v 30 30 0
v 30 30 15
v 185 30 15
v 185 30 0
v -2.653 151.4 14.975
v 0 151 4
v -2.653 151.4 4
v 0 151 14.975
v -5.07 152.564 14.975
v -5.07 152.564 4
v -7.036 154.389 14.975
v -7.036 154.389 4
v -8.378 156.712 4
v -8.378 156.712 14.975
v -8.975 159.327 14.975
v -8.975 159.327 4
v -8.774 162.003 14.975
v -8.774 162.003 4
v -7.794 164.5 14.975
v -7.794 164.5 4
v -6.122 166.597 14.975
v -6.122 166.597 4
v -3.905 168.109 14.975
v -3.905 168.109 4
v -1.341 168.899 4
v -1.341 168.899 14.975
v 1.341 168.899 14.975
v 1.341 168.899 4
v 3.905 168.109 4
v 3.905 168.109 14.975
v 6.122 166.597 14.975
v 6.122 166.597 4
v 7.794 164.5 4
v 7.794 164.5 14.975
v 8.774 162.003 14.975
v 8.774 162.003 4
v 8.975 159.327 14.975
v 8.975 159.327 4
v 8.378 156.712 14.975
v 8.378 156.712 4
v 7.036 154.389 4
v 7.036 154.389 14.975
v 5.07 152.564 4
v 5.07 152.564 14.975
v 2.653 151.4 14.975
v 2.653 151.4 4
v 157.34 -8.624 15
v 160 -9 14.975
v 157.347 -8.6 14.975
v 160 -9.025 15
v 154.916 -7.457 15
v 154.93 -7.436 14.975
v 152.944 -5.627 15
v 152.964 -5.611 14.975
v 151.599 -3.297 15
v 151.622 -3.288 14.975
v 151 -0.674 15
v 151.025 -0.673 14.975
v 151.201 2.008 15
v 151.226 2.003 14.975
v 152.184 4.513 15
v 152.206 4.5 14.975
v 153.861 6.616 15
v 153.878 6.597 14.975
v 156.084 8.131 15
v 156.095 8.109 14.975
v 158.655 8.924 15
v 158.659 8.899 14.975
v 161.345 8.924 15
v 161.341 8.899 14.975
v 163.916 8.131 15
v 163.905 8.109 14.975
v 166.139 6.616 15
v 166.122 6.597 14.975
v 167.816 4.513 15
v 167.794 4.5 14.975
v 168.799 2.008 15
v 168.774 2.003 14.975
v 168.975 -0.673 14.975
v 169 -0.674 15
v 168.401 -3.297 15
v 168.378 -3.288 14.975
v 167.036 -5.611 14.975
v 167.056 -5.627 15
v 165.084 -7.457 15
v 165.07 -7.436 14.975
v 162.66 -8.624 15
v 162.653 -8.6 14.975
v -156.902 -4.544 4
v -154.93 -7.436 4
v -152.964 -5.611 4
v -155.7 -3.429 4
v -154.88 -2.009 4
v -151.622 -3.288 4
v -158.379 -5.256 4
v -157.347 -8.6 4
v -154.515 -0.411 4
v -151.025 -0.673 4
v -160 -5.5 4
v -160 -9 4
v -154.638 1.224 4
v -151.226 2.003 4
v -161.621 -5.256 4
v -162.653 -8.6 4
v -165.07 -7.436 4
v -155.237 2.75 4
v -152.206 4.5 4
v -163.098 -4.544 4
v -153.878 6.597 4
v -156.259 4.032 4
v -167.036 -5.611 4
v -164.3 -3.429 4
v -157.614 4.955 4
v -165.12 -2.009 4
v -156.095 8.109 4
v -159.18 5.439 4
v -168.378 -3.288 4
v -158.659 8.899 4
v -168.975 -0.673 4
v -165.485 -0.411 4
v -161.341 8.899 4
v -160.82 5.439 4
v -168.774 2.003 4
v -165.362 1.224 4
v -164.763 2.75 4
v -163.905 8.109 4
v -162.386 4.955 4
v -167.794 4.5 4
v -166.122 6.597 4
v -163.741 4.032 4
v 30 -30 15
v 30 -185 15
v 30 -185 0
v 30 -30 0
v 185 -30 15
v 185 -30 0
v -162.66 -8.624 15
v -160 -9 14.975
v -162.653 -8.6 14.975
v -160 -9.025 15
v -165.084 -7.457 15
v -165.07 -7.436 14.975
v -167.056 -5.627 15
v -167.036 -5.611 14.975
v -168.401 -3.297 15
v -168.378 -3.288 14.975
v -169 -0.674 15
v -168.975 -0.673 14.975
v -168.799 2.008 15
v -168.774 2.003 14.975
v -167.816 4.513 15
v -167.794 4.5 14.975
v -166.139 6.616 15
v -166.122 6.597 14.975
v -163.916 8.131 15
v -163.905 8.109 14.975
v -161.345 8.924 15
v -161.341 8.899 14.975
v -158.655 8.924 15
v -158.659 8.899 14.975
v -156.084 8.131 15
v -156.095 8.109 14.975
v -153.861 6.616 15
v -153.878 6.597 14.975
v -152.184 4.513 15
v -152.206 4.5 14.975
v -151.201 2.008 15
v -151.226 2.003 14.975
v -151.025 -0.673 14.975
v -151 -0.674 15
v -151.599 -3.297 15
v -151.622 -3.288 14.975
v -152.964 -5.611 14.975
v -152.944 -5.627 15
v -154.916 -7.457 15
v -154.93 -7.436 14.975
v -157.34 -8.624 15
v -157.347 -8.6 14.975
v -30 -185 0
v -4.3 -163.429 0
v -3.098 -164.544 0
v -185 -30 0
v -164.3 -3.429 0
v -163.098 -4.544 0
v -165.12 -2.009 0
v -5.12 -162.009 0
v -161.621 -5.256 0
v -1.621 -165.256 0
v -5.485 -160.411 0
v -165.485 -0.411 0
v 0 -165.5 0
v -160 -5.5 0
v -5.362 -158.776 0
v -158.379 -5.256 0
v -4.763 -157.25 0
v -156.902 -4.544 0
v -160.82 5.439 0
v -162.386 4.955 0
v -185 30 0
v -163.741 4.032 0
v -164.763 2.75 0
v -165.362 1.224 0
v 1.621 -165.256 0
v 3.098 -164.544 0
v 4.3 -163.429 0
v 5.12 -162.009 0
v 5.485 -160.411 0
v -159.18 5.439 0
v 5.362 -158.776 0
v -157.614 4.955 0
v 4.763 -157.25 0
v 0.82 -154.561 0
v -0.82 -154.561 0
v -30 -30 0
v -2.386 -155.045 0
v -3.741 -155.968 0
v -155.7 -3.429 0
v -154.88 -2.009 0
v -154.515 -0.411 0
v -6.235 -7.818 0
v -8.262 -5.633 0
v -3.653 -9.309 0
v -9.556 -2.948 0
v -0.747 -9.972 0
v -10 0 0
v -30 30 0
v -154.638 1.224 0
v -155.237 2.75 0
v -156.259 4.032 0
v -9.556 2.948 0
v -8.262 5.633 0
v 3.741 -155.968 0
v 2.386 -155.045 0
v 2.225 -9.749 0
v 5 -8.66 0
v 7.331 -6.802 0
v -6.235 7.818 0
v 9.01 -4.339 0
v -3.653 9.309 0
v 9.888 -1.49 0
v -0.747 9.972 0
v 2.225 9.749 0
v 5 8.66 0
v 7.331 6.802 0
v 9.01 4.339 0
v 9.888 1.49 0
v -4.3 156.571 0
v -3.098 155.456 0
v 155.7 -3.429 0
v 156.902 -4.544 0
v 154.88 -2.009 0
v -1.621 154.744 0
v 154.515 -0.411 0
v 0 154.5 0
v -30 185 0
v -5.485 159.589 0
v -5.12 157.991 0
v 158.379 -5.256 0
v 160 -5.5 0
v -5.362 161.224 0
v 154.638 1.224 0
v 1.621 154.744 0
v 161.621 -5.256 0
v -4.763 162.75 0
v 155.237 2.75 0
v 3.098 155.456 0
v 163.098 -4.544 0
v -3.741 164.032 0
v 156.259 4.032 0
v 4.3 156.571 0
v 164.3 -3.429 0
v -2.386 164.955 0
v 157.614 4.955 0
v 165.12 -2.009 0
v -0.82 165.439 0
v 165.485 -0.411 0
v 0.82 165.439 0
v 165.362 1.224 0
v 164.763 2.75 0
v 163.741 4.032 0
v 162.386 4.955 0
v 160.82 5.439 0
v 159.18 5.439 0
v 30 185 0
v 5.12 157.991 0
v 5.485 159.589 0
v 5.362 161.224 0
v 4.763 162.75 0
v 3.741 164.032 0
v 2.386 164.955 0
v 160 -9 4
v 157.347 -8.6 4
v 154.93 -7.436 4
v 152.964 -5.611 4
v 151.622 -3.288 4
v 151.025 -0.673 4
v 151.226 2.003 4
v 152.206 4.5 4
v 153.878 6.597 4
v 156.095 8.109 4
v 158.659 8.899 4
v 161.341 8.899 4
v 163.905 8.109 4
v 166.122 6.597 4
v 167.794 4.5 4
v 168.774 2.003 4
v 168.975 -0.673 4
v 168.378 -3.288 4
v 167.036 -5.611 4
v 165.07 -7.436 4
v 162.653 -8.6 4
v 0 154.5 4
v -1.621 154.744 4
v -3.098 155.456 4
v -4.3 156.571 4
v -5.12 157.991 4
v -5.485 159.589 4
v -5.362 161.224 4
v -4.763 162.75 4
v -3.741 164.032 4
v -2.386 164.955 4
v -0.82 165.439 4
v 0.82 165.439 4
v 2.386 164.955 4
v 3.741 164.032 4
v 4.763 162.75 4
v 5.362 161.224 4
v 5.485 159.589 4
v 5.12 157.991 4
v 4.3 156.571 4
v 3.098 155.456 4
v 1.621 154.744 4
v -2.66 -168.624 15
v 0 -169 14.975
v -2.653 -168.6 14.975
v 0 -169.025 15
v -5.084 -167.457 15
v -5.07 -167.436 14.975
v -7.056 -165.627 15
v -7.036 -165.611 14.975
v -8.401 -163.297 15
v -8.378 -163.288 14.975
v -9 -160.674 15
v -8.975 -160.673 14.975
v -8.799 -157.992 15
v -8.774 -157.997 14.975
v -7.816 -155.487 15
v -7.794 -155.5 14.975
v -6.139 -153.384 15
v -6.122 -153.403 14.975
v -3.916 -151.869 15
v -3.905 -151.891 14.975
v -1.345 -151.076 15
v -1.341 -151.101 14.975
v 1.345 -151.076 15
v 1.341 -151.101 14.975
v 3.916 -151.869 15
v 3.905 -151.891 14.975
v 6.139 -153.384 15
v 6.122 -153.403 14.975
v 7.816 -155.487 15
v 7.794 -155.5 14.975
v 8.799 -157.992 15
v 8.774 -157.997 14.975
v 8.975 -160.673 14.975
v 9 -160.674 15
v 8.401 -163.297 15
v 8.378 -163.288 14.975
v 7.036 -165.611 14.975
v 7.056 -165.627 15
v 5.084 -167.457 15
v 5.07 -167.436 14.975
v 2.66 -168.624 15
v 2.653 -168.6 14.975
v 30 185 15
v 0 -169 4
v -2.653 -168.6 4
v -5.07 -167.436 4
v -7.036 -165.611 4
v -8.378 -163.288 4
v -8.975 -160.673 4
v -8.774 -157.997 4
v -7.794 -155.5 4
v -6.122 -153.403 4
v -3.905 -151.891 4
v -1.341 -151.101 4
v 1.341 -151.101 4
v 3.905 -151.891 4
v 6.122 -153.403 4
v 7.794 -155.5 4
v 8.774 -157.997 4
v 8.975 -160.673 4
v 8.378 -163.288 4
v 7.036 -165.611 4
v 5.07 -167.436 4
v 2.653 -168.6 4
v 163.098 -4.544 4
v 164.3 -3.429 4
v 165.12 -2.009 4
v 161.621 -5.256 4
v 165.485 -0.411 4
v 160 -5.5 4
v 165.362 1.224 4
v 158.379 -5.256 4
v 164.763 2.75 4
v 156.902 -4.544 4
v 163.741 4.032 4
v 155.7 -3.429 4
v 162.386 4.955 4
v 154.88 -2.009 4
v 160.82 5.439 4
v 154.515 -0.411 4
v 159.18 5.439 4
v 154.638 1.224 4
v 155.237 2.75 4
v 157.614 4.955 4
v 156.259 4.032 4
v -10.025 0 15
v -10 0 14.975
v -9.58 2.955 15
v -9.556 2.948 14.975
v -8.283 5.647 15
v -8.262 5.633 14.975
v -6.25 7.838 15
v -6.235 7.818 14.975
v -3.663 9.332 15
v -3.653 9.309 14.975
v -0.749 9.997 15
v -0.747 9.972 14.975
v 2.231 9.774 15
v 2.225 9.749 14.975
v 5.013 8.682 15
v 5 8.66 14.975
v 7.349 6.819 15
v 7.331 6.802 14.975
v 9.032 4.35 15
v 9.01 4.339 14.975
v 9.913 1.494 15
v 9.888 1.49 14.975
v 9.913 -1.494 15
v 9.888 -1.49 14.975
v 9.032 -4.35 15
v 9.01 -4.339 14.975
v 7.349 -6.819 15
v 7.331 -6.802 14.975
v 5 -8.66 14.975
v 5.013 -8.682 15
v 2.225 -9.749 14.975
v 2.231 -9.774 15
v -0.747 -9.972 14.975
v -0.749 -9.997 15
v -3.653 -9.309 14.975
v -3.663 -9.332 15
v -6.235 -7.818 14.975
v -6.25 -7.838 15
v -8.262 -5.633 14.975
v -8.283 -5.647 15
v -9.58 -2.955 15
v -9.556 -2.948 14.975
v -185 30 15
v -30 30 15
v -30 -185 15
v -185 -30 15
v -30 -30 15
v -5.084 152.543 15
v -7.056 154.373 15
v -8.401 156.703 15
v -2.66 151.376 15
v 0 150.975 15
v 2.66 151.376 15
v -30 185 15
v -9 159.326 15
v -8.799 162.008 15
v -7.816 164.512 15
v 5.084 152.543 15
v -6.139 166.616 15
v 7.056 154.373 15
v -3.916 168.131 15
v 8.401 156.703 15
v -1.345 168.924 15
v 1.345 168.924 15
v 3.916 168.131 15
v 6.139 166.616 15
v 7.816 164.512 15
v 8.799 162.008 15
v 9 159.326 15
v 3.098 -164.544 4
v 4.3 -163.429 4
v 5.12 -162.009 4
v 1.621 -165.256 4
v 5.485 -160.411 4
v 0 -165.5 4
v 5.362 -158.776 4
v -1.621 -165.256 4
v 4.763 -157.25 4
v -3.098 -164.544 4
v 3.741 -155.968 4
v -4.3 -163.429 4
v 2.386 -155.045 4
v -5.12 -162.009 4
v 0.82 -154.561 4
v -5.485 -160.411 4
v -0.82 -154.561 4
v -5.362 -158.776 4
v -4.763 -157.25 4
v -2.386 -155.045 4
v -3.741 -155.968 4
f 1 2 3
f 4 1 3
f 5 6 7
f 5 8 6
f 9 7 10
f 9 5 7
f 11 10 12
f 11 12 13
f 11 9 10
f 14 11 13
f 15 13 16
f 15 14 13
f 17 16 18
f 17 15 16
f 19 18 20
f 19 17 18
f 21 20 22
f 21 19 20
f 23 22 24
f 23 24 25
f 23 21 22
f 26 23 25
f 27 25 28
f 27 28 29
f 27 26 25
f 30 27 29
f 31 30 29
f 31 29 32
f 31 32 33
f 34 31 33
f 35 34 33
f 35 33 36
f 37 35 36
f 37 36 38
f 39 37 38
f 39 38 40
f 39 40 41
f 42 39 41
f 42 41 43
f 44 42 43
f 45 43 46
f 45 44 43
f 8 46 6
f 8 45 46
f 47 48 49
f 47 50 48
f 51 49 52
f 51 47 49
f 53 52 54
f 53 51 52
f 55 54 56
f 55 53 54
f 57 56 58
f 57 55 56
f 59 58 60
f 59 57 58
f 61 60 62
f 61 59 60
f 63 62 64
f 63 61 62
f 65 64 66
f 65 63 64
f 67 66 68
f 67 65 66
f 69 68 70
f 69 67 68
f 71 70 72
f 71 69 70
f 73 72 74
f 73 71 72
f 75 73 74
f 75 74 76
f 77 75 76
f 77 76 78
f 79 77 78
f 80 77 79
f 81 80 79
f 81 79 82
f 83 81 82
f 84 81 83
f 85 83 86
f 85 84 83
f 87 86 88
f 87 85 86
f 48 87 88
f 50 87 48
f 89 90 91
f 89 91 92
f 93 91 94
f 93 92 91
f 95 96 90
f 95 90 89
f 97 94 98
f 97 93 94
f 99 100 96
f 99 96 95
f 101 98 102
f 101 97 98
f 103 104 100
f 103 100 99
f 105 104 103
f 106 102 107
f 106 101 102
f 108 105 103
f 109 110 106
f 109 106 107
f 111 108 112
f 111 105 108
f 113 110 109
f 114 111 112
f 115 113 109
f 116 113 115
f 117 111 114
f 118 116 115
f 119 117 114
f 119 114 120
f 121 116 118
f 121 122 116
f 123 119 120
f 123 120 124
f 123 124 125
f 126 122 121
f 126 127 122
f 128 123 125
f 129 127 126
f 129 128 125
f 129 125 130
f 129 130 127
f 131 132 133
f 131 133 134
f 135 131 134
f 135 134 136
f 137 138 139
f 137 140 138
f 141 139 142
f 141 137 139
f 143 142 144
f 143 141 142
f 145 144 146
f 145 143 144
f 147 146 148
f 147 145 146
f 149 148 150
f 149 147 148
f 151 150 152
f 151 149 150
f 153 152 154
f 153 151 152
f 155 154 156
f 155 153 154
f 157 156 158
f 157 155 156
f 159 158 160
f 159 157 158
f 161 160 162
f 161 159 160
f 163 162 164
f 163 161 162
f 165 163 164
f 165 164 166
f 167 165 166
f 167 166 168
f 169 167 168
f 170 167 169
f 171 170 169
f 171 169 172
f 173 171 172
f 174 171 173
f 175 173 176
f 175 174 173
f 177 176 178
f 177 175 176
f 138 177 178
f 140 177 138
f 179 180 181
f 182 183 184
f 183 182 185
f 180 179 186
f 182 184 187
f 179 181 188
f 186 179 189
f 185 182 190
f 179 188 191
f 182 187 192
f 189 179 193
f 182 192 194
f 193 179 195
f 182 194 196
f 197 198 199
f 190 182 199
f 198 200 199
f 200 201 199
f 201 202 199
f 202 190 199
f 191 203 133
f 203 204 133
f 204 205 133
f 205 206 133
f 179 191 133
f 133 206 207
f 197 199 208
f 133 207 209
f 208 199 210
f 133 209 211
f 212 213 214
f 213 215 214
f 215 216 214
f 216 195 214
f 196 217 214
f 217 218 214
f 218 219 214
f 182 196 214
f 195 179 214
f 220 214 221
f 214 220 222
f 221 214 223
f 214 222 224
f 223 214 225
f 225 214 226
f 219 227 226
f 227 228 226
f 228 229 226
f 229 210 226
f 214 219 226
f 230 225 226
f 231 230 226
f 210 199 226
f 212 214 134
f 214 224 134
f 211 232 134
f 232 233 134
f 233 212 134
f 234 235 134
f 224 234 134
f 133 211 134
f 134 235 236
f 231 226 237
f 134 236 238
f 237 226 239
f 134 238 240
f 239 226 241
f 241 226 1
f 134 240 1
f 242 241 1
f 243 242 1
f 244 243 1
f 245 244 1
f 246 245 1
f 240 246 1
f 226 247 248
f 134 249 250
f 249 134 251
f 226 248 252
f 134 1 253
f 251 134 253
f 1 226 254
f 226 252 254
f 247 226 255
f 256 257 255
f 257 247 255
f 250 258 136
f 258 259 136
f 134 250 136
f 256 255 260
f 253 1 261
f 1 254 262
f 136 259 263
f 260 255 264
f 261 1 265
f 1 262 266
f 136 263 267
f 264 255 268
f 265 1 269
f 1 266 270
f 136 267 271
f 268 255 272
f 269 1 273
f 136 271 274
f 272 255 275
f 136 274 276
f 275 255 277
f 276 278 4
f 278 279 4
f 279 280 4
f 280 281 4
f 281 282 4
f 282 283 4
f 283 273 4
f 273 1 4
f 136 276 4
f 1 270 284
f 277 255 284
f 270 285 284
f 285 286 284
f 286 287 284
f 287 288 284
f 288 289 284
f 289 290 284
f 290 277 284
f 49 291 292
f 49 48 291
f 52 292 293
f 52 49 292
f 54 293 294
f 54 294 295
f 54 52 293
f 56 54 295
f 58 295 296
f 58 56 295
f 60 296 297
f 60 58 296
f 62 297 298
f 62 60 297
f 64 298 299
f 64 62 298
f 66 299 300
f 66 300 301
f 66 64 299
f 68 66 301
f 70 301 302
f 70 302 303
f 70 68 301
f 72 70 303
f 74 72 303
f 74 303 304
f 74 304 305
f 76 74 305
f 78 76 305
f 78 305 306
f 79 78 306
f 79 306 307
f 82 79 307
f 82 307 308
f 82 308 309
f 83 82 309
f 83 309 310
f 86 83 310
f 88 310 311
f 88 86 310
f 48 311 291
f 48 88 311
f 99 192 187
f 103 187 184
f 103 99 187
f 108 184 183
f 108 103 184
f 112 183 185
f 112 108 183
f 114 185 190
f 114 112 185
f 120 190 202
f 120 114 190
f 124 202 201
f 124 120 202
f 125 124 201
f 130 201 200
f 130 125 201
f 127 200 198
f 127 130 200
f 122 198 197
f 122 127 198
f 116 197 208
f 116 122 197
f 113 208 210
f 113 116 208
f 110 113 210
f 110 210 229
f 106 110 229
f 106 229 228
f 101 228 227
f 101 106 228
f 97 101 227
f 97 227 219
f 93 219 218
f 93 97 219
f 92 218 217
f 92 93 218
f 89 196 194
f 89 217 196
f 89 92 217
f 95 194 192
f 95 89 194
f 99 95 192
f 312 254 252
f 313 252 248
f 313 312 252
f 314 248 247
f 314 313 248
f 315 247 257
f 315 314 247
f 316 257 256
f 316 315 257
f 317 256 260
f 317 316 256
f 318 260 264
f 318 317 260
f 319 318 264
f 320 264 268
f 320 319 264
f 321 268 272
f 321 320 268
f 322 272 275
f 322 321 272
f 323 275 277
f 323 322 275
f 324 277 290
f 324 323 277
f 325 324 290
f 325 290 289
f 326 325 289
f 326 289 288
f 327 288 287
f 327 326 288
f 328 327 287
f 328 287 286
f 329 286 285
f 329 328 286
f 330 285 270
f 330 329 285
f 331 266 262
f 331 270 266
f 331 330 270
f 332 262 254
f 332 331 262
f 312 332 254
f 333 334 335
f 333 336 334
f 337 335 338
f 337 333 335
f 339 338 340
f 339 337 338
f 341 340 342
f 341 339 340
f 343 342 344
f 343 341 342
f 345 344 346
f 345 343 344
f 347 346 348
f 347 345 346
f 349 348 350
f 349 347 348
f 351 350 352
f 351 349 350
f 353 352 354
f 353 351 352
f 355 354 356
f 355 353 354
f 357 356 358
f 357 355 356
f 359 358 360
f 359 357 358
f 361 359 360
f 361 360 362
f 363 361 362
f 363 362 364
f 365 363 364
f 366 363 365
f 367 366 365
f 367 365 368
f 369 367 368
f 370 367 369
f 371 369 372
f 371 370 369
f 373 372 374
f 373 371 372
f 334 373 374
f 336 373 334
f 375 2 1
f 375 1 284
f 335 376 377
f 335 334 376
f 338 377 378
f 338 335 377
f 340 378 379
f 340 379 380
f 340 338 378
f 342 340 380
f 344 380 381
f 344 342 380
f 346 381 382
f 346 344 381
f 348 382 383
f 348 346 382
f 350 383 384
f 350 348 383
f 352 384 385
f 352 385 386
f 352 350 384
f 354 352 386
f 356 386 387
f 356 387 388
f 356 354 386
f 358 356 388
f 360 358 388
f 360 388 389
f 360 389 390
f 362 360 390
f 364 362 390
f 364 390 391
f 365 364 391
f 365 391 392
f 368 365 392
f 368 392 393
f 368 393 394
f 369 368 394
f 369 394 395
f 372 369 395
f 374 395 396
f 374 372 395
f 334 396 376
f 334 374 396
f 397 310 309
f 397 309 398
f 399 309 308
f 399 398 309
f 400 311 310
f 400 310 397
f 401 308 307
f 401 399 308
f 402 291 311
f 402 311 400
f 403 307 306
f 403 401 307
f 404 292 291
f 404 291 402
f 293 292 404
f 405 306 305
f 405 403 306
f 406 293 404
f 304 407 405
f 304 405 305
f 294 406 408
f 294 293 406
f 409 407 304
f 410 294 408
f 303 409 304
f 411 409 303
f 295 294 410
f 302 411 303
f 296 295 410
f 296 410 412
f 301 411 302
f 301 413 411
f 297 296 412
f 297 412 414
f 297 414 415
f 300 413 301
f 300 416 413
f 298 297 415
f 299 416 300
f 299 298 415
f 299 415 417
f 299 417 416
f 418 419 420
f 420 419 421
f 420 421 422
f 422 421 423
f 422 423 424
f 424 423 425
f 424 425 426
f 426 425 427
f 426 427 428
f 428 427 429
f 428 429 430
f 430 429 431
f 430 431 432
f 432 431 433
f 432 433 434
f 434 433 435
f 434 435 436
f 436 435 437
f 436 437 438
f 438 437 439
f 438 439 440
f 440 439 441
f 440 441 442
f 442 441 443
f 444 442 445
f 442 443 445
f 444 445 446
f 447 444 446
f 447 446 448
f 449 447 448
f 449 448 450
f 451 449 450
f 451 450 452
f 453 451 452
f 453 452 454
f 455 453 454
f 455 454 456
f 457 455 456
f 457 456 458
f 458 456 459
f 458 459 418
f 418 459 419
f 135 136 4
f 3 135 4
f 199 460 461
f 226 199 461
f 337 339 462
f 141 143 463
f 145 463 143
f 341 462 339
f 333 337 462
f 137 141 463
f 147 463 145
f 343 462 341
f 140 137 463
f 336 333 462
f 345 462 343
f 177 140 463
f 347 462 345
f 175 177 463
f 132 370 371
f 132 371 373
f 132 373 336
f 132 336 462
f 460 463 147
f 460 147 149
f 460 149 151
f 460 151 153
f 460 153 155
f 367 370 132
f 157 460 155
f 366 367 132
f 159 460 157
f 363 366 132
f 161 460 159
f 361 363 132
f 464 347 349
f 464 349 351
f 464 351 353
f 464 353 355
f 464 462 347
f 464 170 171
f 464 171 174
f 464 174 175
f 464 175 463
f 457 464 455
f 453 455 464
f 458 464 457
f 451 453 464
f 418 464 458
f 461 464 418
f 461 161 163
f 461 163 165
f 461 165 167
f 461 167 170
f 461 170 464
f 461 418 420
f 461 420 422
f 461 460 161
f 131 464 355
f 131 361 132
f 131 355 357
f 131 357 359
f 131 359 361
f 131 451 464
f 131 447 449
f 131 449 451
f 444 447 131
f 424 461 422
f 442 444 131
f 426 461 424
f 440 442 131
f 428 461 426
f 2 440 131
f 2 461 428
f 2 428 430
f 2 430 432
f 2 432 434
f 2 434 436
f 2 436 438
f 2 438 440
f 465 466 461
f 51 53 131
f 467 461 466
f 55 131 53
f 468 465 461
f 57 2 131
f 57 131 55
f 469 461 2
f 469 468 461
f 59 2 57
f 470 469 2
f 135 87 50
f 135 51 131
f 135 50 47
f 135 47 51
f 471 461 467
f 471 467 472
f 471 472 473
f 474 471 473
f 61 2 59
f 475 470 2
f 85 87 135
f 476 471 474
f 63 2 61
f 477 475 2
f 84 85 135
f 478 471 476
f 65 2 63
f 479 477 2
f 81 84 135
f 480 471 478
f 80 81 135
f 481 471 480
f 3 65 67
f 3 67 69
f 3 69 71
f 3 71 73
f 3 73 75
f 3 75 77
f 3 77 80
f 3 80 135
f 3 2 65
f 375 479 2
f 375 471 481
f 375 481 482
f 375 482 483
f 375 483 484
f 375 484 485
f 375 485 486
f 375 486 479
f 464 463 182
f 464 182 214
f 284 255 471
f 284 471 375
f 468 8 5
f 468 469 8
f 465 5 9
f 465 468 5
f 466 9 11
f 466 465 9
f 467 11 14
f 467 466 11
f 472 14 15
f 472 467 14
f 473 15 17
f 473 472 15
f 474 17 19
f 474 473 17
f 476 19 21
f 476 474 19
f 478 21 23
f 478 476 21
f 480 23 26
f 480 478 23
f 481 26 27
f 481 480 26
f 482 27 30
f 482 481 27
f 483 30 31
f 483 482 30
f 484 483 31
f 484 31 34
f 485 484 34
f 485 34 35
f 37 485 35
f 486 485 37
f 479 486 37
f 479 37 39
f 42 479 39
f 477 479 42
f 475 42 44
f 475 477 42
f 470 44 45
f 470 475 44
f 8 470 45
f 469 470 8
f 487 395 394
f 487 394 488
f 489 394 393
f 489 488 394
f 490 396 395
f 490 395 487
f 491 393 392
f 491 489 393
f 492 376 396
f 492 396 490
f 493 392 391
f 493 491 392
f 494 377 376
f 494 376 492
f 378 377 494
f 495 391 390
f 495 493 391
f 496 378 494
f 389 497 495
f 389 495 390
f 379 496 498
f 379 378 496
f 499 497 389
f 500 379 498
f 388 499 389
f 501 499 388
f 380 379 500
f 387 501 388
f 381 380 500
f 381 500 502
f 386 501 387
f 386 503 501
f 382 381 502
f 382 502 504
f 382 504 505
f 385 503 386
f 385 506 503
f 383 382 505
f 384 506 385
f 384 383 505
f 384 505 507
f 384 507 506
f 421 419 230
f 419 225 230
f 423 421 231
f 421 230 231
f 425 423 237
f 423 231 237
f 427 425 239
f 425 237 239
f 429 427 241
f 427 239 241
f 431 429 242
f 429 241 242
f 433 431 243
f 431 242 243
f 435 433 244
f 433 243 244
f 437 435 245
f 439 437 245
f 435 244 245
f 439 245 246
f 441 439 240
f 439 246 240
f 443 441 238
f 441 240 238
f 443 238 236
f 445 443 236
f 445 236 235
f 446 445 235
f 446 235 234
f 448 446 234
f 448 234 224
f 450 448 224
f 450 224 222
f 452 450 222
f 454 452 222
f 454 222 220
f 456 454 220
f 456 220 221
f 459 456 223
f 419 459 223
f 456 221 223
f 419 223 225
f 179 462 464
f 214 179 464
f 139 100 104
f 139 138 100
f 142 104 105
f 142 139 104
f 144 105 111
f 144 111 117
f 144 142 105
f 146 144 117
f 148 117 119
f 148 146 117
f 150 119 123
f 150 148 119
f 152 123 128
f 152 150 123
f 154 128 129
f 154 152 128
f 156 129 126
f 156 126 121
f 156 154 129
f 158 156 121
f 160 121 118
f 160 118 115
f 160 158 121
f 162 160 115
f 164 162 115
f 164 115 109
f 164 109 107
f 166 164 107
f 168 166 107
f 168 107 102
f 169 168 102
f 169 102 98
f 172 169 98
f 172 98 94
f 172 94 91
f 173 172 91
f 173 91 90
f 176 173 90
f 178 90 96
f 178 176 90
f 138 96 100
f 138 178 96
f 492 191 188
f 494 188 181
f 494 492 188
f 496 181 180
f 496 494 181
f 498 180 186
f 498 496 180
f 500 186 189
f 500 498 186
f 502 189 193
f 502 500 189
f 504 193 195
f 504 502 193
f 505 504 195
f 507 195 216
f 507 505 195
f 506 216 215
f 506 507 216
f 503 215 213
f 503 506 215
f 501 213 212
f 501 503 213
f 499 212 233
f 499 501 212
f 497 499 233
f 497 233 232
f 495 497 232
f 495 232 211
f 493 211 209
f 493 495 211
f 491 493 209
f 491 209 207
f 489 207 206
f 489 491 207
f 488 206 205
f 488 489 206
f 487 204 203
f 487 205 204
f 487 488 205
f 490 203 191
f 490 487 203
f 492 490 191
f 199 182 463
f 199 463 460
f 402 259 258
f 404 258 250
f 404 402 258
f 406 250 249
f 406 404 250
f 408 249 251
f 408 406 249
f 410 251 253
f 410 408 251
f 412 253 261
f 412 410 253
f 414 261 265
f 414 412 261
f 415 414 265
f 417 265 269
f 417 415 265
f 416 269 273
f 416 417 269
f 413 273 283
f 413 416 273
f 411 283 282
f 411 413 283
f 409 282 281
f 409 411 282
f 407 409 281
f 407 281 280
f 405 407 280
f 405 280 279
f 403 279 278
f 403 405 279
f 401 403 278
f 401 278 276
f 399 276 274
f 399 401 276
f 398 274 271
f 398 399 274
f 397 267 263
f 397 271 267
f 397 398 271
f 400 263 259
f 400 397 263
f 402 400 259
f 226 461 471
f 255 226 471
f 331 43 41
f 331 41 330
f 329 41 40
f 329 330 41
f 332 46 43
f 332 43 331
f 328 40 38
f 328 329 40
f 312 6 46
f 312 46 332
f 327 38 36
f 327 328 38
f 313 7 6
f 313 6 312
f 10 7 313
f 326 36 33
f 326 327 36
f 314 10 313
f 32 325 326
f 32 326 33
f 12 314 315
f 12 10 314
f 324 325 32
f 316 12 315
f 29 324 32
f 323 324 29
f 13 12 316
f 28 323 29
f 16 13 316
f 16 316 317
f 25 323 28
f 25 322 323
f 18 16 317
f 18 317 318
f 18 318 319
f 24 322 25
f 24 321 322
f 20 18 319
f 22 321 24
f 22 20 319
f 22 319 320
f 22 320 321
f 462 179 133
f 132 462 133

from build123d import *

# Parameters (mm, degrees)
SKETCH_1_W               = 370
SKETCH_1_H               = 370
EXTRUDE_1_DEPTH          = 15
SKETCH_2_W               = 155
SKETCH_2_H               = 155
CUT_EXTRUDE_1_DEPTH      = 20
HOLE_WIZARD_1_AT_2_COUNT = 2
HOLE_WIZARD_1_AT_2_PITCH = 320
HOLE_WIZARD_1_AT_3_COUNT = 2
HOLE_WIZARD_1_AT_3_PITCH = 226.27416998
HOLE_WIZARD_1_AT_4_COUNT = 2
HOLE_WIZARD_1_AT_4_PITCH = 226.27416998
MM_1_D                   = 20
MM_1_DEPTH               = 17
MM_1_CSINK_D             = 20.05
MM_1_CSINK_ANGLE         = 90
MM_1_TIP                 = 6.00860619


with BuildPart() as part:
    # 草图1 → 凸台-拉伸1 (new body)
    with BuildSketch(Plane.XY):
        Rectangle(SKETCH_1_W, SKETCH_1_H)
    extrude(amount=EXTRUDE_1_DEPTH)

    # 草图2 → 切除-拉伸1 (cut)
    with BuildSketch(Plane.XY.offset(15)):
        with Locations((107.5, 107.5)):
            Rectangle(SKETCH_2_W, SKETCH_2_H)
        with Locations((-107.5, 107.5)):
            Rectangle(SKETCH_2_W, SKETCH_2_H)
        with Locations((-107.5, -107.5)):
            Rectangle(SKETCH_2_W, SKETCH_2_H)
        with Locations((107.5, -107.5)):
            Rectangle(SKETCH_2_W, SKETCH_2_H)
    extrude(amount=-CUT_EXTRUDE_1_DEPTH, mode=Mode.SUBTRACT)

    # 草图4 → 打孔尺寸(%根据)内六角圆柱头螺钉的类型1 (revolve, cut)
    with BuildSketch(Plane(origin=(-160, 0, 15), x_dir=(0, -1, 0), z_dir=(1, 0, 0))):
        Polygon((0, 0), (0, 20.304733405), (5.5, 17), (5.5, 11), (9, 11), (9, 0.025), (9.025, 0), align=None)
    hole_wizard_1 = revolve(axis=Axis((-160, 0, 21.35), (0, 0, -1)), mode=Mode.SUBTRACT)

    # 打孔尺寸(%根据)内六角圆柱头螺钉的类型1 at 2: 打孔尺寸(%根据)内六角圆柱头螺钉的类型1 ×2
    with Locations(*[(i * HOLE_WIZARD_1_AT_2_PITCH, 0, 0) for i in range(1, HOLE_WIZARD_1_AT_2_COUNT)]):
        add(hole_wizard_1, mode=Mode.SUBTRACT)

    # 打孔尺寸(%根据)内六角圆柱头螺钉的类型1 at 3: 打孔尺寸(%根据)内六角圆柱头螺钉的类型1 ×2
    with Locations(*[Vector(0.707106781, 0.707106781, 0) * (i * HOLE_WIZARD_1_AT_3_PITCH) for i in range(1, HOLE_WIZARD_1_AT_3_COUNT)]):
        add(hole_wizard_1, mode=Mode.SUBTRACT)

    # 打孔尺寸(%根据)内六角圆柱头螺钉的类型1 at 4: 打孔尺寸(%根据)内六角圆柱头螺钉的类型1 ×2
    with Locations(*[Vector(0.707106781, -0.707106781, 0) * (i * HOLE_WIZARD_1_AT_4_PITCH) for i in range(1, HOLE_WIZARD_1_AT_4_COUNT)]):
        add(hole_wizard_1, mode=Mode.SUBTRACT)

    # 大小mm 暗销槽口1
    with Locations(Plane.XY.offset(15)):
        with Locations((0, 0)):
            CounterSinkHole(MM_1_D / 2, MM_1_CSINK_D / 2, depth=MM_1_DEPTH, counter_sink_angle=MM_1_CSINK_ANGLE)
            with Locations((0, 0, -(MM_1_DEPTH + MM_1_TIP / 2))):  # 118° drill point
                Cone(0, MM_1_D / 2, MM_1_TIP, mode=Mode.SUBTRACT)


solid = part.part
